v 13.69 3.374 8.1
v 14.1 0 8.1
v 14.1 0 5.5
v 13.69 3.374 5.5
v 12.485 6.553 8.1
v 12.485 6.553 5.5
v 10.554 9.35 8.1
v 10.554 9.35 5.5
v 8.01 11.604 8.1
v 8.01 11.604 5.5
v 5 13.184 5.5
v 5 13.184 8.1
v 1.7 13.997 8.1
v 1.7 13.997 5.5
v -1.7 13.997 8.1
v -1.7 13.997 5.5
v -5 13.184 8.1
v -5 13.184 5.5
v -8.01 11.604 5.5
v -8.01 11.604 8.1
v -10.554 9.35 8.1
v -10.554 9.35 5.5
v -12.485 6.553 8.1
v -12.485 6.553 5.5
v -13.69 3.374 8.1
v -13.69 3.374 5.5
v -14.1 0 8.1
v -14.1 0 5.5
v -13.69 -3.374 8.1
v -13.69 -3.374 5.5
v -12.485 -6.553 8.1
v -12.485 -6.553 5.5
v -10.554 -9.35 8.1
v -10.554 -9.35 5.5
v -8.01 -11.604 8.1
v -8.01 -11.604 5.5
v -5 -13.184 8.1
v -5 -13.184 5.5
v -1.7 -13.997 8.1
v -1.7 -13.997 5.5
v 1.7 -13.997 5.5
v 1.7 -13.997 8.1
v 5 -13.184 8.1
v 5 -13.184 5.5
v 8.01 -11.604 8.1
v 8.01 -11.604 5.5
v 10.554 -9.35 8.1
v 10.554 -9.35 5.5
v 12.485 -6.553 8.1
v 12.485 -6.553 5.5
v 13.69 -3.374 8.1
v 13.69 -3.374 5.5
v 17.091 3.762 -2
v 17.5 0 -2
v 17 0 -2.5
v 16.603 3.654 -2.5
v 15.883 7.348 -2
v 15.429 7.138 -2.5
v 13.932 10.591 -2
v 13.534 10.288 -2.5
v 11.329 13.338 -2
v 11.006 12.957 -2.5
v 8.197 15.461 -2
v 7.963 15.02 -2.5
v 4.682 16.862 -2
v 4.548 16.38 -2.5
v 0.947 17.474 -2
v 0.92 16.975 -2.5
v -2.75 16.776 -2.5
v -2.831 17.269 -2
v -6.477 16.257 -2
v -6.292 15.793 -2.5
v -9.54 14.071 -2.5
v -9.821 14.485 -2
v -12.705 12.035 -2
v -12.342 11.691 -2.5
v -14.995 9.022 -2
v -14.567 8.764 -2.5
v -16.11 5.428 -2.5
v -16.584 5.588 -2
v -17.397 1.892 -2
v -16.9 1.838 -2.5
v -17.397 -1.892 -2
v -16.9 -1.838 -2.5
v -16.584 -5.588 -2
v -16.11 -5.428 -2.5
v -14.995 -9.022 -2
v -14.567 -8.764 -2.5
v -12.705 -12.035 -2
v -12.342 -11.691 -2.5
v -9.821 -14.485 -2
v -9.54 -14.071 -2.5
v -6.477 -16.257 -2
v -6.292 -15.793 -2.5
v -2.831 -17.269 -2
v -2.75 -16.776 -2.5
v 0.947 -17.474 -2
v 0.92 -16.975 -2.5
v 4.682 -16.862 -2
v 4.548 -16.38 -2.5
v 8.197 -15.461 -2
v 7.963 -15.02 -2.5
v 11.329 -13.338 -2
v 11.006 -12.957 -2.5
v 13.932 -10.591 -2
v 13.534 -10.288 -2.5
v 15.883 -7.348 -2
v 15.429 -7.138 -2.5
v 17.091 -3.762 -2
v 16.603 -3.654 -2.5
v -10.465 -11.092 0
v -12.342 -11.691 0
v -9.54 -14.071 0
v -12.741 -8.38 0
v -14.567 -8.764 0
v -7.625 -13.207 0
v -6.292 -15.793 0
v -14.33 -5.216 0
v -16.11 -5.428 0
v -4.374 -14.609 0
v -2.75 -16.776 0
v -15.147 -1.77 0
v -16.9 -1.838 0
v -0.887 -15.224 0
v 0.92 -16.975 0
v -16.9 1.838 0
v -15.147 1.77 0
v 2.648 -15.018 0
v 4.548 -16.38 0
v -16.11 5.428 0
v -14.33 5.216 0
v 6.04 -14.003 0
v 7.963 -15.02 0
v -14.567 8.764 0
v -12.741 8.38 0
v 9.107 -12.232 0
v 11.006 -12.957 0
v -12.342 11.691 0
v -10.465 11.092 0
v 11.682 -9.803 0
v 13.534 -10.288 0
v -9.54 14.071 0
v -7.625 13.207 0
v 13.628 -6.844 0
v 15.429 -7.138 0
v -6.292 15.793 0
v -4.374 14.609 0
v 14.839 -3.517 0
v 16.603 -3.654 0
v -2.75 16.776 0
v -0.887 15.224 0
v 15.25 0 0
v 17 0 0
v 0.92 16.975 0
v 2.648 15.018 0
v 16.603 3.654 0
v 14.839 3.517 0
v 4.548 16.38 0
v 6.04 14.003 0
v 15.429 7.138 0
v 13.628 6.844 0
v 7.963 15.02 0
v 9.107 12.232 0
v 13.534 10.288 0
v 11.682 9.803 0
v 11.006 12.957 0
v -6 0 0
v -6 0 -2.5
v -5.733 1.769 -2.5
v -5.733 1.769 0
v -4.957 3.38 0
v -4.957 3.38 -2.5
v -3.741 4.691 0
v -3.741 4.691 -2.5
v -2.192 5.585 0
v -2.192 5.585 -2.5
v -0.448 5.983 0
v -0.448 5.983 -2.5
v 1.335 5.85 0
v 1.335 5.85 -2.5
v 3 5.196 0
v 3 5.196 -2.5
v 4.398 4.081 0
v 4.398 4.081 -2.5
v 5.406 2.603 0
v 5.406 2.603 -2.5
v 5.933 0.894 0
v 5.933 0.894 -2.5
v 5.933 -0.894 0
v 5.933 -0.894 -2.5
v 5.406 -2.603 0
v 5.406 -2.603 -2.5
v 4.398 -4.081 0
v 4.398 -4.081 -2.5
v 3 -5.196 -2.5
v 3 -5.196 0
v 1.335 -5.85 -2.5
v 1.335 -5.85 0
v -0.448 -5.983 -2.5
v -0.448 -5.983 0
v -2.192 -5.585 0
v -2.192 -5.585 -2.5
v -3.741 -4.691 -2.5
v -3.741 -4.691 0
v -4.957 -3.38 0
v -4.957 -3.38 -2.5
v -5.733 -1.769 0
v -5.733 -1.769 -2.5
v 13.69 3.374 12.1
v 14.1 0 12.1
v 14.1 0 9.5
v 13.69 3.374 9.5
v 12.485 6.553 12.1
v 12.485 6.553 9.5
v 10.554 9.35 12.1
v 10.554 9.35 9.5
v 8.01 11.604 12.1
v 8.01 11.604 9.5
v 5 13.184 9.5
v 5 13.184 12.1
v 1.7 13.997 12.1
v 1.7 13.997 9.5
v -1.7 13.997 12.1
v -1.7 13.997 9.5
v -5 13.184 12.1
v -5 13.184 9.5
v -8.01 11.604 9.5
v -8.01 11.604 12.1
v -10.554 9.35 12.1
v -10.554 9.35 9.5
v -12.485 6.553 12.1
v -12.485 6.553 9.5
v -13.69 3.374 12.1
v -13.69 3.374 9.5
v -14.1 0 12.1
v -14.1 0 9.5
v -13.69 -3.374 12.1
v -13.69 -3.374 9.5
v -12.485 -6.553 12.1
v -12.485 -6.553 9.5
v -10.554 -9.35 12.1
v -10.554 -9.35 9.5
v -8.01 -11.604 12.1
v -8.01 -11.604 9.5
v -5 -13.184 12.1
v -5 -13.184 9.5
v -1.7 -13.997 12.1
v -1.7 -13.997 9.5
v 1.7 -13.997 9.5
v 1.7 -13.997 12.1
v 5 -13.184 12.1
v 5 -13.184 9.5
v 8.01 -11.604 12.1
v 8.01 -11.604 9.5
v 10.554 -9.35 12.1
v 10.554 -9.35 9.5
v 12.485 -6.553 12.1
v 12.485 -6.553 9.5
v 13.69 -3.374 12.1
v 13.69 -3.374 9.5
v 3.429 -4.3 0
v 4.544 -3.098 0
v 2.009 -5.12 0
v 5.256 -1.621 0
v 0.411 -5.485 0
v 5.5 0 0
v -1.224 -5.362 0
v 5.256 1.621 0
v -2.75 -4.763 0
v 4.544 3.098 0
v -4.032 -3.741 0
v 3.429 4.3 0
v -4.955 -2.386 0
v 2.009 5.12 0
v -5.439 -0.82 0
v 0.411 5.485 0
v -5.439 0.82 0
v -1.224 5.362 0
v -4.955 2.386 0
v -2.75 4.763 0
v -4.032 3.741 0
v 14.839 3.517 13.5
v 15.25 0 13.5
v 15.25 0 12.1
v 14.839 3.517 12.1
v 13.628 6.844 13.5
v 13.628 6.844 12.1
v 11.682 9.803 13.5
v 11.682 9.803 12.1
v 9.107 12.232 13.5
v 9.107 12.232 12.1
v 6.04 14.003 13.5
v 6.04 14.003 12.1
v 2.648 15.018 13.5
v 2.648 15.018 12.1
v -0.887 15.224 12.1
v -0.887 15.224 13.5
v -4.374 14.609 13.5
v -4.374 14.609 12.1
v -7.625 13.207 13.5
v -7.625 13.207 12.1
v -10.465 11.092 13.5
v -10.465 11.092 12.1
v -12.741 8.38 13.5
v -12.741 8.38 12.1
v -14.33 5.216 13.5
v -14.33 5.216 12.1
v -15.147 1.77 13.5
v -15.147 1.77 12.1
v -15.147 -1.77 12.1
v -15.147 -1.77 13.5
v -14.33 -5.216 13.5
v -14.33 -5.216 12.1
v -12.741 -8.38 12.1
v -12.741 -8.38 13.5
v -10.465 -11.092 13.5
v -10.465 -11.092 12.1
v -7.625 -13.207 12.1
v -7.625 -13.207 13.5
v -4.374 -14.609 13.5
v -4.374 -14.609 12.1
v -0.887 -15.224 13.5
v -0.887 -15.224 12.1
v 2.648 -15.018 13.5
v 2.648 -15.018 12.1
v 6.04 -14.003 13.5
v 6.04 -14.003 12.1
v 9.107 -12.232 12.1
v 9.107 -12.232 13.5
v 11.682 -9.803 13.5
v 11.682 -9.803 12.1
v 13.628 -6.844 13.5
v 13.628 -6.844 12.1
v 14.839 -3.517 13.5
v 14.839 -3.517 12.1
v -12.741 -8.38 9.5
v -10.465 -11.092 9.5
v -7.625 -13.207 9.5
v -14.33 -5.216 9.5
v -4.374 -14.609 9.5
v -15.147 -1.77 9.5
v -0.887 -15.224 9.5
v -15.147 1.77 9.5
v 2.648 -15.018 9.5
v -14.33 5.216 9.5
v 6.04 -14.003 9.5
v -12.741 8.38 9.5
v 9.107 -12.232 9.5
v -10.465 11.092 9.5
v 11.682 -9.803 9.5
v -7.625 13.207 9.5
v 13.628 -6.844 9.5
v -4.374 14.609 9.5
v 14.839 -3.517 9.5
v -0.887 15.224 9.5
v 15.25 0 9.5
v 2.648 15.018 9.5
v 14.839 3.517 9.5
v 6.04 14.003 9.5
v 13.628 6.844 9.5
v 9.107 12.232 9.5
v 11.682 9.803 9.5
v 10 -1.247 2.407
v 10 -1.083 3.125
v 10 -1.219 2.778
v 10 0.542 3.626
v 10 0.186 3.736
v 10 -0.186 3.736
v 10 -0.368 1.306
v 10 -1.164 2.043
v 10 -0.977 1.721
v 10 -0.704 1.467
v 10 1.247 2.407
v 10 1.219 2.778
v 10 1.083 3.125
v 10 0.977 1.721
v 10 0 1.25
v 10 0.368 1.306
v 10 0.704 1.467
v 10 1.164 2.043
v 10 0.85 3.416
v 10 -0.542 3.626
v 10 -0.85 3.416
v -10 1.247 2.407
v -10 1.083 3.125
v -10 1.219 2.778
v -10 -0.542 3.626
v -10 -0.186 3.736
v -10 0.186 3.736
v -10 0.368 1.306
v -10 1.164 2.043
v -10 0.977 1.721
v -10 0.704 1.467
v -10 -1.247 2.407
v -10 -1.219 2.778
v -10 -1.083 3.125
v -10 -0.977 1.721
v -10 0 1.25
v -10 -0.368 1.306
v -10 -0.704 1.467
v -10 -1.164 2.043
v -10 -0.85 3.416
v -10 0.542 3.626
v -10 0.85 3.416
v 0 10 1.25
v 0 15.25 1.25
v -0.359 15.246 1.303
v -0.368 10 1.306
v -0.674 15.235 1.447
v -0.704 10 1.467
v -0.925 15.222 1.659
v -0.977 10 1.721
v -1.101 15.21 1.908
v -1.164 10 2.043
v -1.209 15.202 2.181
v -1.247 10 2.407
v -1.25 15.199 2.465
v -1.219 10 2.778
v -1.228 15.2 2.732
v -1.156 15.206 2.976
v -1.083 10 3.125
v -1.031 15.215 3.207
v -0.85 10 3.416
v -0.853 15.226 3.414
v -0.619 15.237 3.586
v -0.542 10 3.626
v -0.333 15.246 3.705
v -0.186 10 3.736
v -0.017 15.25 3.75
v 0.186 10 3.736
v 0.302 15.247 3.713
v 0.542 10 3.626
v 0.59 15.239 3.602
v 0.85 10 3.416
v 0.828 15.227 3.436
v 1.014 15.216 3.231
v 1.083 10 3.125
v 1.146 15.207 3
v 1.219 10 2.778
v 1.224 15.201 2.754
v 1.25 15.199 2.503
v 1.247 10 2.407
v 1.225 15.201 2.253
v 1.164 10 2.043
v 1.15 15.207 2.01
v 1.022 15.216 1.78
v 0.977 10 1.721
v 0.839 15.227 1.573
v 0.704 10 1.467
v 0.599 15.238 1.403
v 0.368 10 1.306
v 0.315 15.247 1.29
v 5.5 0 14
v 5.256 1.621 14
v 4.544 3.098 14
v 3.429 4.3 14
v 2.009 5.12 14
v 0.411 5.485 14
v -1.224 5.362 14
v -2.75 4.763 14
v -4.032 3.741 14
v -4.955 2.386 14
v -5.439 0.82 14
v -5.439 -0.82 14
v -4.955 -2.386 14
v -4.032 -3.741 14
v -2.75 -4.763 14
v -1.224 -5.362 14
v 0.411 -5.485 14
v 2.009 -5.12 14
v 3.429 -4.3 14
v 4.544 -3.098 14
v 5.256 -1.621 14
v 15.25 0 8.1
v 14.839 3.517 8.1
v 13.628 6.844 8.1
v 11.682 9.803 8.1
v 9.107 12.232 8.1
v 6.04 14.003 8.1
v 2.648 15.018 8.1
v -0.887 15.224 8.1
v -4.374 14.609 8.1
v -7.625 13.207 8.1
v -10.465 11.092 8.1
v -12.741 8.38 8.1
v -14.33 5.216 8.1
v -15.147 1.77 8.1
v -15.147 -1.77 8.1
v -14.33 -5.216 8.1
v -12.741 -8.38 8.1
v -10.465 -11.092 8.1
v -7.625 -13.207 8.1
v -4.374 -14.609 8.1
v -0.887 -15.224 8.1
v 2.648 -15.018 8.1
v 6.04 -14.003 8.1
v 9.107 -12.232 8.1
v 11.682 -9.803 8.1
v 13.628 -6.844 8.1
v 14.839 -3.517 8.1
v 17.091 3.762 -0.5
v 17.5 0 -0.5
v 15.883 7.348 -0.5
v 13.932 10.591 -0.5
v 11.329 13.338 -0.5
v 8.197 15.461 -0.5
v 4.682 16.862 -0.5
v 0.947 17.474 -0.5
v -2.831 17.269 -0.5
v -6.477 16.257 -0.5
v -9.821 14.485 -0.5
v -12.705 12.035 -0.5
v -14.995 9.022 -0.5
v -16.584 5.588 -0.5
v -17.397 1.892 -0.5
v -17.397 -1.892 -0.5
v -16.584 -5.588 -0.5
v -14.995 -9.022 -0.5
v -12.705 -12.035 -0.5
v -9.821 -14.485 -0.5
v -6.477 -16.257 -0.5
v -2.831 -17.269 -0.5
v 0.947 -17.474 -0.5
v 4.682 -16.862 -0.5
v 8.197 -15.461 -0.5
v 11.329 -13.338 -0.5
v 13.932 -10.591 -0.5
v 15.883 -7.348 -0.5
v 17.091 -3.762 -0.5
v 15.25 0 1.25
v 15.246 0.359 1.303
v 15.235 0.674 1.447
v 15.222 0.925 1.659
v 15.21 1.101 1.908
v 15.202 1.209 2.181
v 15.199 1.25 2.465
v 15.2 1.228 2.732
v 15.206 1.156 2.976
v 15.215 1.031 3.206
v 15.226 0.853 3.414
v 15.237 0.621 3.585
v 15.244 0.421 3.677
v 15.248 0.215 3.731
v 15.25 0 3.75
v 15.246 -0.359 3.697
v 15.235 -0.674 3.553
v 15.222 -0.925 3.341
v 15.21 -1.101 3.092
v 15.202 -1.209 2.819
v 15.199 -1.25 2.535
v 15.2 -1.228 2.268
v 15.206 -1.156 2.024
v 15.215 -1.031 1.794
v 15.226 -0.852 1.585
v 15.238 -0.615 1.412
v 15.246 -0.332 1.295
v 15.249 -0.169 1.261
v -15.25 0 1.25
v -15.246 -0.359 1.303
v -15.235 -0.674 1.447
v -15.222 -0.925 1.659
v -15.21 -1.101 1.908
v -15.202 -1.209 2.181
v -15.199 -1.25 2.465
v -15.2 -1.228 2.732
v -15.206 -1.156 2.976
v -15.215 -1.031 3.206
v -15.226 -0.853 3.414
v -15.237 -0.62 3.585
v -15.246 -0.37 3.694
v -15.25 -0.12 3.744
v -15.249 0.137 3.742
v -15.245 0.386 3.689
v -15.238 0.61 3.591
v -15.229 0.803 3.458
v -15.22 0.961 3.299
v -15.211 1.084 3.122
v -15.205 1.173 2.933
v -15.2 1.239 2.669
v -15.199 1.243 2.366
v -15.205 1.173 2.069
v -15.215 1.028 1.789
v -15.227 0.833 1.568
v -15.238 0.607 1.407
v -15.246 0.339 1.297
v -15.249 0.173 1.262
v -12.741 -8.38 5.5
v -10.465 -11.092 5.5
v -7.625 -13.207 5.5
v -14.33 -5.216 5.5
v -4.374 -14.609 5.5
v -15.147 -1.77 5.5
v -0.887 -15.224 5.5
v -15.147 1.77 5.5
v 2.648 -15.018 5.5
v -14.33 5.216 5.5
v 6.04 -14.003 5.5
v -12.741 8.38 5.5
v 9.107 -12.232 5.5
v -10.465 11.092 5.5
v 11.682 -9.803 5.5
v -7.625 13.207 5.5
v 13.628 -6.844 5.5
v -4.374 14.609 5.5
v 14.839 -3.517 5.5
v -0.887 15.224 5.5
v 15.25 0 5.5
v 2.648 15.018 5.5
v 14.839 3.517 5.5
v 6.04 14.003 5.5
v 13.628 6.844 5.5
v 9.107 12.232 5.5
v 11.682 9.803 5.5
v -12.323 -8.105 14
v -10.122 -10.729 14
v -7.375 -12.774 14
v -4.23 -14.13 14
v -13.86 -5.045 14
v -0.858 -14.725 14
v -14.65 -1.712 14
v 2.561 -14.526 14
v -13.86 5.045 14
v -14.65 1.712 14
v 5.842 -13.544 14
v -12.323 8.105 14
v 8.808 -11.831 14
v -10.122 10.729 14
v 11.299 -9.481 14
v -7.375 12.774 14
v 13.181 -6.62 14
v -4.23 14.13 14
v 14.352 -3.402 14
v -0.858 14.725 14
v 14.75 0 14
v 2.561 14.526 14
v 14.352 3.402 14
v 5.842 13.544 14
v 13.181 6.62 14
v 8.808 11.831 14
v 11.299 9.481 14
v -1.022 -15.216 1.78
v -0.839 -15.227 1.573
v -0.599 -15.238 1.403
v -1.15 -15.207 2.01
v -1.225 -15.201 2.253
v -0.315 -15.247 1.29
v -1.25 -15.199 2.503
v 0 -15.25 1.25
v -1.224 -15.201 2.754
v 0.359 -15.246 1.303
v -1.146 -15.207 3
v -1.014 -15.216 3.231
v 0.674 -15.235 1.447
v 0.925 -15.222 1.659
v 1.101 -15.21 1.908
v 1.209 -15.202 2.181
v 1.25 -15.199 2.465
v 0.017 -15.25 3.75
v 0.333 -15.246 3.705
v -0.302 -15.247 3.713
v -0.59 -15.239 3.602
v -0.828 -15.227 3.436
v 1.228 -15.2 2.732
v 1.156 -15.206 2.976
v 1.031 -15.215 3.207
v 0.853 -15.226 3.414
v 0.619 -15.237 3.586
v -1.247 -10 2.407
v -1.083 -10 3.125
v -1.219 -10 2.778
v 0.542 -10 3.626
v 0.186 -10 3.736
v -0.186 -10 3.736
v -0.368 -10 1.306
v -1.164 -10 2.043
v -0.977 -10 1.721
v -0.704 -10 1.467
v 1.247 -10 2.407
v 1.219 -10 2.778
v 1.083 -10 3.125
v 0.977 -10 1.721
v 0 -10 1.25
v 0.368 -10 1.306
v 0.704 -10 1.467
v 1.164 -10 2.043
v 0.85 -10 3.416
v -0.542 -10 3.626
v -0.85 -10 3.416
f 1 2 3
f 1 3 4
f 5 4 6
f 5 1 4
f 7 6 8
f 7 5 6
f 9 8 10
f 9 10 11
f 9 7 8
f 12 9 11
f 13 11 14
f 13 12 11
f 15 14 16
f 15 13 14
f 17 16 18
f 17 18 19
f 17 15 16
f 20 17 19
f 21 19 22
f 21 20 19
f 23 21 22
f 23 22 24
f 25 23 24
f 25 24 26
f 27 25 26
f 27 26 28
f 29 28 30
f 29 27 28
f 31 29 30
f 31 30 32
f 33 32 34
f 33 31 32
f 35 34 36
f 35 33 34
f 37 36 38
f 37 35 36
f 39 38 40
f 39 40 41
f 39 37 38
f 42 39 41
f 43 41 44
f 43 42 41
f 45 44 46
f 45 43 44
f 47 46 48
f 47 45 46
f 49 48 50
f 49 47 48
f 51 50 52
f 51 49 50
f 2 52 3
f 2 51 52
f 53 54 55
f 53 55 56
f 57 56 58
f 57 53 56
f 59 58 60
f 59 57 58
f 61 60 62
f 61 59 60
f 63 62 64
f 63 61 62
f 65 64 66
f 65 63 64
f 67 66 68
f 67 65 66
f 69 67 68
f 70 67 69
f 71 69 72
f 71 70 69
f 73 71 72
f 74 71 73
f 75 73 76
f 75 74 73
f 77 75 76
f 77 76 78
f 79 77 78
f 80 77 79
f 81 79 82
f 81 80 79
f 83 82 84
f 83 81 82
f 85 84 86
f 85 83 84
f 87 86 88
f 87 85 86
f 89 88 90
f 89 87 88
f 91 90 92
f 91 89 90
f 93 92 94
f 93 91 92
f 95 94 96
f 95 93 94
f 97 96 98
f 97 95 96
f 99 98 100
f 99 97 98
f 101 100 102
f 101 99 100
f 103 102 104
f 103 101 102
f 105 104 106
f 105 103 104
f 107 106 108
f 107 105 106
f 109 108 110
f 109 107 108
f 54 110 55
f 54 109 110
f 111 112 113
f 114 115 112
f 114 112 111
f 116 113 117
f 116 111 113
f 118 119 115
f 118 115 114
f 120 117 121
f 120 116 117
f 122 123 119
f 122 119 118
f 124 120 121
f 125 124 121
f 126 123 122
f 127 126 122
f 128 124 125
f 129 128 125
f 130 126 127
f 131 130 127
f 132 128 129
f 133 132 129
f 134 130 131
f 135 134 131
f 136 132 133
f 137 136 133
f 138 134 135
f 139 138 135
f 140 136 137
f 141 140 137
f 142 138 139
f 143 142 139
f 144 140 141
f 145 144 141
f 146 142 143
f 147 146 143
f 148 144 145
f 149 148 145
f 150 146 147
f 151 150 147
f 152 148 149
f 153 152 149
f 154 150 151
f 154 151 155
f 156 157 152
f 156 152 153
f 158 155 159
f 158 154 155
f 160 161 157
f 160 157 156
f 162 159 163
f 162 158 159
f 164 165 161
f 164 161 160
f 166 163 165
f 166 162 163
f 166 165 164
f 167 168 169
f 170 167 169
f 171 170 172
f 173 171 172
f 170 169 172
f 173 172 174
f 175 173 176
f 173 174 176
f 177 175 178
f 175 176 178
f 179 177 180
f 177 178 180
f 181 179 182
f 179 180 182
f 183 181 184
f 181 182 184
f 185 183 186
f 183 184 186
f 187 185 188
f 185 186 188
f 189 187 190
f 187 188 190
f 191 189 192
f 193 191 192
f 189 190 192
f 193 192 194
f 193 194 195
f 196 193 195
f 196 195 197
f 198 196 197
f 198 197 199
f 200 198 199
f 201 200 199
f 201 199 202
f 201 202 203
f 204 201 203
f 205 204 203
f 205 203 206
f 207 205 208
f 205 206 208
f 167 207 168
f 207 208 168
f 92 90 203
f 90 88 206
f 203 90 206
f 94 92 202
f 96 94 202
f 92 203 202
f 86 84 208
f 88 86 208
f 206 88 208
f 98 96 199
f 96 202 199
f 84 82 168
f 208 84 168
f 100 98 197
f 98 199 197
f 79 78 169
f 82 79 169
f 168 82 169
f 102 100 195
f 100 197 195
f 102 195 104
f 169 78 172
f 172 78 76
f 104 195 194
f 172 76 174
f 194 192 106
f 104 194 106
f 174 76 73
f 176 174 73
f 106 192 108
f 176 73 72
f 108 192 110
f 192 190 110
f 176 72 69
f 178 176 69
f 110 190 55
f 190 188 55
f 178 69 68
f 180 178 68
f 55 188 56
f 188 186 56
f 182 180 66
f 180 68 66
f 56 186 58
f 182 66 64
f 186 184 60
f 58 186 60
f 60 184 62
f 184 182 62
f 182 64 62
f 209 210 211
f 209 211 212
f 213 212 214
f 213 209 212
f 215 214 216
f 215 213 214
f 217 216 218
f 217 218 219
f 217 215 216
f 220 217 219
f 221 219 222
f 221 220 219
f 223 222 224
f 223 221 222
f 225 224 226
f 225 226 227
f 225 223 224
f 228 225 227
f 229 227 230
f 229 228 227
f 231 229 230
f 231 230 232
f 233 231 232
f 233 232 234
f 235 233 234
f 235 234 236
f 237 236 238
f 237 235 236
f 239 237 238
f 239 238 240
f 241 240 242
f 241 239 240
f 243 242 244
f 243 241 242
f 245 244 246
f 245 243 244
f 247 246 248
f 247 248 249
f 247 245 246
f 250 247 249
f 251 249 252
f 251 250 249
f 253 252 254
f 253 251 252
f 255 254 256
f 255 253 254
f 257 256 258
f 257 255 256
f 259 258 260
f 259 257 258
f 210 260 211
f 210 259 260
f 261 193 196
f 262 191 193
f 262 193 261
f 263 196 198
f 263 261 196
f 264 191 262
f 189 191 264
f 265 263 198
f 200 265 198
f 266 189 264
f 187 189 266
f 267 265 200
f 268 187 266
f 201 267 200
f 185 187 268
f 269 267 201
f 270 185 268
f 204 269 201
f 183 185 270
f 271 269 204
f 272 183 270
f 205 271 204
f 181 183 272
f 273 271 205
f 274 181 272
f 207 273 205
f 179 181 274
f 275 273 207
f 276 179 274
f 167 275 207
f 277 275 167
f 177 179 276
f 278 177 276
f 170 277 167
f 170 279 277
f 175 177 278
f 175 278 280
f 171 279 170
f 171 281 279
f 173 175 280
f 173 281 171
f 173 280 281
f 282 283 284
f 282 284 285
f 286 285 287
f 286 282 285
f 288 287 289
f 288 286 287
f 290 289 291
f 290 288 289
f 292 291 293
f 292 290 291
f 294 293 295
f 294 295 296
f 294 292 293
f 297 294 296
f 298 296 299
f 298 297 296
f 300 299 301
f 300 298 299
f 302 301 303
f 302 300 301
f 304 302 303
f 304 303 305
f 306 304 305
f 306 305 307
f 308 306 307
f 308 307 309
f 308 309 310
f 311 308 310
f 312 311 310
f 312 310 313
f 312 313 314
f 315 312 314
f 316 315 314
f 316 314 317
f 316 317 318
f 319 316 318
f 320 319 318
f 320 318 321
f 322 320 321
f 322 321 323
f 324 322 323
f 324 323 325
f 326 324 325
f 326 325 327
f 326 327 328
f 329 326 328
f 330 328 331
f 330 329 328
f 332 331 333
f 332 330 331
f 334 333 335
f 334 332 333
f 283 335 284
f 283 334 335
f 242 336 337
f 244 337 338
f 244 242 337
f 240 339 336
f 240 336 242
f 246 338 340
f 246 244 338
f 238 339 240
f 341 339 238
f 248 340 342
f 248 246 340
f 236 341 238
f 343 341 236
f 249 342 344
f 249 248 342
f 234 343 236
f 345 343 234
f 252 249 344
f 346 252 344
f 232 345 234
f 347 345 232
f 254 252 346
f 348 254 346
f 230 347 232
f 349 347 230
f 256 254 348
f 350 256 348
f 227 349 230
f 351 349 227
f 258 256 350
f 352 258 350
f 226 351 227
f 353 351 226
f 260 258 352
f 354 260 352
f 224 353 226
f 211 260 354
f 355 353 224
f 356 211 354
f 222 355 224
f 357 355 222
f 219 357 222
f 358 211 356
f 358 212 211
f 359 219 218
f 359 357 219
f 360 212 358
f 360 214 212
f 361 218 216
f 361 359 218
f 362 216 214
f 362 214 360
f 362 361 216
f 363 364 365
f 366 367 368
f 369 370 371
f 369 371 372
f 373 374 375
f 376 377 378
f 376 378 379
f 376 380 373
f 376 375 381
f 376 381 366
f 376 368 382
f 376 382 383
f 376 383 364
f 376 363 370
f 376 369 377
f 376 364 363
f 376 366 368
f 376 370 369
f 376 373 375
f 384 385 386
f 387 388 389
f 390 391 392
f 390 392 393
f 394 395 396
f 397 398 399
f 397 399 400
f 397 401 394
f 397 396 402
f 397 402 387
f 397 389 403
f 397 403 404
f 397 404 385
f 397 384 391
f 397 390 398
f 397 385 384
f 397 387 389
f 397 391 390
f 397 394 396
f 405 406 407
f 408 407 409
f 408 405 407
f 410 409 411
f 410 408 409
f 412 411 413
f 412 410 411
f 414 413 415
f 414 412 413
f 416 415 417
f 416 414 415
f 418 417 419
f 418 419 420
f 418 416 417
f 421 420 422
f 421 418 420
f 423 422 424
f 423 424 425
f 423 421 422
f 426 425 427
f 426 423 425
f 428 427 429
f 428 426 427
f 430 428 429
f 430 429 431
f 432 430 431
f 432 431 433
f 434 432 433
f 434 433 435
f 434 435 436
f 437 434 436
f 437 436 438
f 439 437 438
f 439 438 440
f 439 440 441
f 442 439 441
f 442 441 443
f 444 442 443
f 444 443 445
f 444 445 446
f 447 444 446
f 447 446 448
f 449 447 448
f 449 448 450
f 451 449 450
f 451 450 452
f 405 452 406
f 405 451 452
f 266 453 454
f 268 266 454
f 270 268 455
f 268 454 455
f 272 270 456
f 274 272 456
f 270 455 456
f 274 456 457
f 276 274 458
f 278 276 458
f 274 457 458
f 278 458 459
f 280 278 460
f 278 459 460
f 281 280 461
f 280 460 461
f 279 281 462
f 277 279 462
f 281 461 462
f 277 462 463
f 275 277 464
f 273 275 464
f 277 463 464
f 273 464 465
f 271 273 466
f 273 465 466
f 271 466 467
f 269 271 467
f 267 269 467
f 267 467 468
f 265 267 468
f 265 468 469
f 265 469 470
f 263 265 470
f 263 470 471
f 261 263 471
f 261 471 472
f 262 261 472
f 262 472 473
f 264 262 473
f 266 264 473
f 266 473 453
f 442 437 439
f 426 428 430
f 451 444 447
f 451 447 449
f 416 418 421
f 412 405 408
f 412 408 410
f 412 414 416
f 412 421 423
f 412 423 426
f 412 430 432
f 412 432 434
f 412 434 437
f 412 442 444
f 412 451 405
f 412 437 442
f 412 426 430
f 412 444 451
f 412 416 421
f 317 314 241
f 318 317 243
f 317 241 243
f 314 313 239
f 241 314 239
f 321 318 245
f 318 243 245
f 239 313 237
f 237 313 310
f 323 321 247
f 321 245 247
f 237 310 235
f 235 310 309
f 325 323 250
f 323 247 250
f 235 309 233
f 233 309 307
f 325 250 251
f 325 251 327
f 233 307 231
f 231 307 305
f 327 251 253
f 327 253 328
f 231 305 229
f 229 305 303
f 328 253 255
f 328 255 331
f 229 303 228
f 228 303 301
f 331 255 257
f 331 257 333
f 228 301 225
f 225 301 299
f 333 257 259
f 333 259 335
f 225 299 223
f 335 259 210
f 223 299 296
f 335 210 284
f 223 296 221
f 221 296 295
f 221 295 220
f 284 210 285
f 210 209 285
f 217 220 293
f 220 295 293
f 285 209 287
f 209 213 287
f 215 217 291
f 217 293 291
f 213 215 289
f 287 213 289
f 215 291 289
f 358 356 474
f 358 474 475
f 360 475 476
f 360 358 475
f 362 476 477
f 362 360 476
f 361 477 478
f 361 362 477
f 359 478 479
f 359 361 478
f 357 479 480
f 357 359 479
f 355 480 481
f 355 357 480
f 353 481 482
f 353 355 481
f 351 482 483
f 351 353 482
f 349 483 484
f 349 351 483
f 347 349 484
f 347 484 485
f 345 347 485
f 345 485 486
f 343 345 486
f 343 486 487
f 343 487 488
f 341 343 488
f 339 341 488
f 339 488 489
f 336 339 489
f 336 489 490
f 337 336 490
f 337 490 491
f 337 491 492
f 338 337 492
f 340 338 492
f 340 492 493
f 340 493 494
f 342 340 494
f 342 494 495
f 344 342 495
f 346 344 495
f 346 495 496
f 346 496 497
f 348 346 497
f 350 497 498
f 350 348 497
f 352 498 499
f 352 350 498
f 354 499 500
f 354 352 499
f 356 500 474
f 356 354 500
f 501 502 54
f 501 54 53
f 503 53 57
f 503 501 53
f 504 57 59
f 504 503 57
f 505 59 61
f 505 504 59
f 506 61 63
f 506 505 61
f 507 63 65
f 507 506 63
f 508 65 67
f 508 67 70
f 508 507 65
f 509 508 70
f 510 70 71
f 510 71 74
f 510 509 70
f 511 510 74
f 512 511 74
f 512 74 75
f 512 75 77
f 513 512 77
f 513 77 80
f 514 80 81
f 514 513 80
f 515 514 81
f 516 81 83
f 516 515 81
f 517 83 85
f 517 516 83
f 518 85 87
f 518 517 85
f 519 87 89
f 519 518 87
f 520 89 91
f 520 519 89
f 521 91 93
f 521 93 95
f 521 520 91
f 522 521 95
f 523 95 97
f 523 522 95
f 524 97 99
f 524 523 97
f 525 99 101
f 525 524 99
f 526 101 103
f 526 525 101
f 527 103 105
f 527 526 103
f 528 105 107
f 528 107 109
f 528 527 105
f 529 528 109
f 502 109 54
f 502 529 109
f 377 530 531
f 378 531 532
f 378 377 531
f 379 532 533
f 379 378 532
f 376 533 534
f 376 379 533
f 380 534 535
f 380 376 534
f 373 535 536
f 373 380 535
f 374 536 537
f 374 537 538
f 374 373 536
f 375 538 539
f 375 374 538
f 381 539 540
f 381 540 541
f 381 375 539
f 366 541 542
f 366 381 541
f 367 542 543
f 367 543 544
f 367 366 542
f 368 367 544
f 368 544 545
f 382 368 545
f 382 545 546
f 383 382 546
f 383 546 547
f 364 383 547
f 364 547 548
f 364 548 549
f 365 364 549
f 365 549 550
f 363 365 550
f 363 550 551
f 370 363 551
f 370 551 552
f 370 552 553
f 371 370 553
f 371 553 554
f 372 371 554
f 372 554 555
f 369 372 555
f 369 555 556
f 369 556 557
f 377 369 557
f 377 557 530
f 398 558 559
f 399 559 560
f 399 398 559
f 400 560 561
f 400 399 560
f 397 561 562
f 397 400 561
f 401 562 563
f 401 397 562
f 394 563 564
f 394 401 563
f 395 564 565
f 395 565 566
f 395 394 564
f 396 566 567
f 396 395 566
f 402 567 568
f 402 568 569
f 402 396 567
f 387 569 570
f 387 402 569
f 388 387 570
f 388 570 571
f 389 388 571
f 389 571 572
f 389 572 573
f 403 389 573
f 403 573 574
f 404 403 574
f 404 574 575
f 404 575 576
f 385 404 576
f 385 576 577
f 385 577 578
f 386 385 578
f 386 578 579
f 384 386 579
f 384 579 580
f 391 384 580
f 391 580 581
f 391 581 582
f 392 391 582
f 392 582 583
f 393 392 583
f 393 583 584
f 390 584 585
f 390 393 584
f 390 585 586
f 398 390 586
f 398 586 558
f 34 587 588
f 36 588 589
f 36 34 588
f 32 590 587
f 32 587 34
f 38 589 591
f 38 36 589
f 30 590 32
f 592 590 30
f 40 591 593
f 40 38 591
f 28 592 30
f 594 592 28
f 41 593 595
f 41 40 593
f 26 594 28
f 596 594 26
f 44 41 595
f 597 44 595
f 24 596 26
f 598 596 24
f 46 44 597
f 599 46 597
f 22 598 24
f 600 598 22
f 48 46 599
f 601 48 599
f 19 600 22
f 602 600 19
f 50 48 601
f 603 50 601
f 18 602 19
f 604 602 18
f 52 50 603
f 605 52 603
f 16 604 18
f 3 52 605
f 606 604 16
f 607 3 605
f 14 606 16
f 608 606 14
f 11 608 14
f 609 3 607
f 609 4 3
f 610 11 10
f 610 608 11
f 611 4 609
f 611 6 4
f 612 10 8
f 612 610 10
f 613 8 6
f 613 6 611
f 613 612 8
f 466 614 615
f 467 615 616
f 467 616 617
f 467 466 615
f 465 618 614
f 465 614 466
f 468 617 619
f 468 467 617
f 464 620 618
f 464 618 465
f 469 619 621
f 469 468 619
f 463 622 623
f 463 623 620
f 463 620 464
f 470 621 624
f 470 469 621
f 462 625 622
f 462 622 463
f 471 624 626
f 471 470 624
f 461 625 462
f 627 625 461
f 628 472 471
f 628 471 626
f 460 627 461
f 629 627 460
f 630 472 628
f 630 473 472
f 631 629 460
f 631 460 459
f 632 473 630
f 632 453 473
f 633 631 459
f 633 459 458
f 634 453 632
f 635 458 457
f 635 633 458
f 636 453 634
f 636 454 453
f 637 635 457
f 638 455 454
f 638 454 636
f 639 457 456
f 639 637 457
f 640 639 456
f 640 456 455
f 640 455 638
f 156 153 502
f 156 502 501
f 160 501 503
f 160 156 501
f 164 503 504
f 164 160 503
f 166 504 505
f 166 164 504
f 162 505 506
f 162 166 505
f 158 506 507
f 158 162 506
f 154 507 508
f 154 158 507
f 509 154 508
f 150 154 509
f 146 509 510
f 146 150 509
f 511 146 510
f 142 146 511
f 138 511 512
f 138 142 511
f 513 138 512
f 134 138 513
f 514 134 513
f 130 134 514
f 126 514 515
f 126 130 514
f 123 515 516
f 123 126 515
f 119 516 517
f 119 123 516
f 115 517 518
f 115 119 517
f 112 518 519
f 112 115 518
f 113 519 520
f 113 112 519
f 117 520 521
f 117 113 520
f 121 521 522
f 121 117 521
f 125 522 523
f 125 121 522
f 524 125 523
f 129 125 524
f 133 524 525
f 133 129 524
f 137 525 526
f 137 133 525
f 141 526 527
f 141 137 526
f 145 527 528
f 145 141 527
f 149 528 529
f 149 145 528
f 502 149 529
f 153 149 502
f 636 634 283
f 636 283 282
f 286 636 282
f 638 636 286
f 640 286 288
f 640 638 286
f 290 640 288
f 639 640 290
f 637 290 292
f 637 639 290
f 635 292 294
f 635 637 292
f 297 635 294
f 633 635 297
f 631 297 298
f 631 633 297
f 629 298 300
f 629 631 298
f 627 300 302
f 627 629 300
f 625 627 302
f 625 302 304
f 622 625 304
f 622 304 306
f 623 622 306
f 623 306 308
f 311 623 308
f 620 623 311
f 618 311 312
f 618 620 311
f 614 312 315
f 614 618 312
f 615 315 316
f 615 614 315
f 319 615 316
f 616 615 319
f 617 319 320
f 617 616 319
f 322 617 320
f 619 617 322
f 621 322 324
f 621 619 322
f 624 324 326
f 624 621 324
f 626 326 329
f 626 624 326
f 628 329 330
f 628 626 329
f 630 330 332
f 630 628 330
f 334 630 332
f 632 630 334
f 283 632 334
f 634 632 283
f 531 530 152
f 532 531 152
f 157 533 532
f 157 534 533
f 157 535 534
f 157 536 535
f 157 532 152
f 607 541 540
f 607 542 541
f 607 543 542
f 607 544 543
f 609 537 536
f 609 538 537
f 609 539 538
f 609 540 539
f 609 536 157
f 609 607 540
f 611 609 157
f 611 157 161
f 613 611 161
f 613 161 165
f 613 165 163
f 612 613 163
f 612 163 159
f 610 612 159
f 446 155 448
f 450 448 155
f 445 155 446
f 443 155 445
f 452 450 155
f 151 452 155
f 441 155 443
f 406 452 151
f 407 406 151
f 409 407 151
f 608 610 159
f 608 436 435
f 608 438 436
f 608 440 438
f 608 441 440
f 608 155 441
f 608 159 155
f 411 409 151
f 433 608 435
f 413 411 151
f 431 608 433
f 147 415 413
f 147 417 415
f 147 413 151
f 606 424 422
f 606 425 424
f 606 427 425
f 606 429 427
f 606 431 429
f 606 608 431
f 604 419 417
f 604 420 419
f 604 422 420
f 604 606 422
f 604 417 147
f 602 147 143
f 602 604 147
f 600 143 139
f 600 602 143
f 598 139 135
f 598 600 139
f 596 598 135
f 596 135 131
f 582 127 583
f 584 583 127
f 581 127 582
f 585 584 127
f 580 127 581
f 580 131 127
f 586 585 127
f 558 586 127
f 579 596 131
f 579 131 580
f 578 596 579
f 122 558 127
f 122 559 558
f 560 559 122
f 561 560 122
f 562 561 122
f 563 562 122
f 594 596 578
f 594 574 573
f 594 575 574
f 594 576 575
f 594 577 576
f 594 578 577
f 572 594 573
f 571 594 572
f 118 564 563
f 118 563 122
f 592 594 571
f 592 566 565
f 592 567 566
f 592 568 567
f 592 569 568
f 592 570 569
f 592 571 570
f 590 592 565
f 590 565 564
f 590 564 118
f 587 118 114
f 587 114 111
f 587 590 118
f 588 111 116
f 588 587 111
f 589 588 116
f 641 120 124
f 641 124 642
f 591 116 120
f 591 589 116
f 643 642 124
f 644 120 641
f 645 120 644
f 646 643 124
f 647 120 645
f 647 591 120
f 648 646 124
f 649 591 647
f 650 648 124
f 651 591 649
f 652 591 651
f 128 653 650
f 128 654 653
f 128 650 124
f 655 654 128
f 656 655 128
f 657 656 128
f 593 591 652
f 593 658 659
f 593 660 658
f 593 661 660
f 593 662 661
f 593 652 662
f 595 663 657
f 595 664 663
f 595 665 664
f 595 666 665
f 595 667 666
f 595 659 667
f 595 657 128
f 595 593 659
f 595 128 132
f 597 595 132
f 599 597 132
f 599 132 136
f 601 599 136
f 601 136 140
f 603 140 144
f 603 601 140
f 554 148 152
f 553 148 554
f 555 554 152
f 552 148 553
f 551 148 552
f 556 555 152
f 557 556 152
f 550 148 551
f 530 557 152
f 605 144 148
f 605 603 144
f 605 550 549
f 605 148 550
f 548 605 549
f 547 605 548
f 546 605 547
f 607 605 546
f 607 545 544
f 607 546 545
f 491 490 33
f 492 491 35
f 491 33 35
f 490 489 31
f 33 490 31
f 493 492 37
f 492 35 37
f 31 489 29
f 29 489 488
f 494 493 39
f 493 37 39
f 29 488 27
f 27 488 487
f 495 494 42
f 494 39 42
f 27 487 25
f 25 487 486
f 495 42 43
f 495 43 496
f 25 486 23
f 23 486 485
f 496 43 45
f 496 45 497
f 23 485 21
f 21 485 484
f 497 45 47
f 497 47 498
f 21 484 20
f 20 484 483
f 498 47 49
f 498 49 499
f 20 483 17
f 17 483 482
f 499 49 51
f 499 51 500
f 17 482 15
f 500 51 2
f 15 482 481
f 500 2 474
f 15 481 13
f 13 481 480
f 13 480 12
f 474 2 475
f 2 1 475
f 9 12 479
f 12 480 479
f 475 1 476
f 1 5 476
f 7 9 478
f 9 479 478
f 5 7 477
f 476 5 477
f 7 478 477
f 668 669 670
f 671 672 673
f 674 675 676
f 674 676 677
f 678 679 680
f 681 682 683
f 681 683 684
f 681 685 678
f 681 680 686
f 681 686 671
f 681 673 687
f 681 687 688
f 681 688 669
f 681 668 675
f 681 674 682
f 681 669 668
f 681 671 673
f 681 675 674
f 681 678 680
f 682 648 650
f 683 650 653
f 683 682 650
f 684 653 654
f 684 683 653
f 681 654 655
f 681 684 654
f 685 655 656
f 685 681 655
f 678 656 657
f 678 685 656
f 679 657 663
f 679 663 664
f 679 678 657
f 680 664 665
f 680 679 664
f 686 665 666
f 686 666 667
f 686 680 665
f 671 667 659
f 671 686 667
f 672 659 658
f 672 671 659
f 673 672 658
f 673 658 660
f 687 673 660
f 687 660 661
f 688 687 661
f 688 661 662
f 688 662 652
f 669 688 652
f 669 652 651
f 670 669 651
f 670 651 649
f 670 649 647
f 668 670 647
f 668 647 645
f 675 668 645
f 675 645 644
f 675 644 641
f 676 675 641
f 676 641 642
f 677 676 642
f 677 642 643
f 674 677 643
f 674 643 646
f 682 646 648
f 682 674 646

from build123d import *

# Parameters (mm, degrees)
SKETCH_1_R               = 17.5
SKETCH_1_R_2             = 5.5
EXTRUDE_1_DEPTH          = 2.5
EXTRUDE_START            = 14
SKETCH_1_3_R             = 15.25
SKETCH_1_3_R_2           = 5.5
EXTRUDE_2_DEPTH          = 14
CUT_EXTRUDE_START        = 8.1
SKETCH_1_4_R             = 15.25
SKETCH_1_4_R_2           = 14.1
CUT_EXTRUDE_1_DEPTH      = 2.6
CUT_EXTRUDE_START_2      = 12.1
SKETCH_1_5_R             = 15.25
SKETCH_1_5_R_2           = 14.1
CUT_EXTRUDE_2_DEPTH      = 2.6
CHAMFER_1_SIZE           = 0.5
SKETCH_2_R               = 6
CUT_EXTRUDE_3_DEPTH      = 2.5
CUT_EXTRUDE_START_3      = 10
SKETCH_3_R               = 1.25
CUT_EXTRUDE_4_DEPTH      = 10
PATTERN_CIRCULAR_1_COUNT = 4


with BuildPart() as part:
    # Эскиз1 → Бобышка-Вытянуть1 (new body)
    with BuildSketch(Plane.XY):
        Circle(SKETCH_1_R)
        Circle(SKETCH_1_R_2, mode=Mode.SUBTRACT)
    extrude(amount=-EXTRUDE_1_DEPTH)

    # Эскиз1<3> → Бобышка-Вытянуть2 (add)
    with BuildSketch(Plane.XY.offset(EXTRUDE_START)):
        Circle(SKETCH_1_3_R)
        Circle(SKETCH_1_3_R_2, mode=Mode.SUBTRACT)
    extrude(amount=-EXTRUDE_2_DEPTH)

    # Эскиз1<4> → Вырез-Вытянуть1 (cut)
    with BuildSketch(Plane.XY.offset(CUT_EXTRUDE_START)):
        Circle(SKETCH_1_4_R)
        Circle(SKETCH_1_4_R_2, mode=Mode.SUBTRACT)
    extrude(amount=-CUT_EXTRUDE_1_DEPTH, mode=Mode.SUBTRACT)

    # Эскиз1<5> → Вырез-Вытянуть2 (cut)
    with BuildSketch(Plane.XY.offset(CUT_EXTRUDE_START_2)):
        Circle(SKETCH_1_5_R)
        Circle(SKETCH_1_5_R_2, mode=Mode.SUBTRACT)
    extrude(amount=-CUT_EXTRUDE_2_DEPTH, mode=Mode.SUBTRACT)

    # Фаска1
    chamfer_1_edges = [part.edges().sort_by_distance(p)[0] for p in [
        (-15.25, 0, 14),
        (-17.5, 0, 0),
        (-17.5, 0, -2.5),
    ]]
    chamfer(chamfer_1_edges, length=CHAMFER_1_SIZE)

    # Эскиз2 → Вырез-Вытянуть3 (cut)
    with BuildSketch(Plane(origin=(0, 0, -2.5), x_dir=(-1, 0, 0), z_dir=(0, 0, -1))):
        Circle(SKETCH_2_R)
    extrude(amount=-CUT_EXTRUDE_3_DEPTH, mode=Mode.SUBTRACT)

    # Эскиз3 → Вырез-Вытянуть4 (cut)
    with BuildSketch(Plane(origin=(0, 0, 0), x_dir=(1, 0, 0), z_dir=(0, 1, 0)).offset(CUT_EXTRUDE_START_3)):
        with Locations((0, -2.5)):
            Circle(SKETCH_3_R)
    cut_extrude_4 = extrude(amount=CUT_EXTRUDE_4_DEPTH, mode=Mode.SUBTRACT)

    # Круговой массив1: Вырез-Вытянуть4 ×4 about axis
    pattern_circular_1_axis = Axis((0, 0, 0), (0, 0, -1))
    for i in range(1, PATTERN_CIRCULAR_1_COUNT):
        add(cut_extrude_4.rotate(pattern_circular_1_axis, i * 360 / PATTERN_CIRCULAR_1_COUNT), mode=Mode.SUBTRACT)


solid = part.part
